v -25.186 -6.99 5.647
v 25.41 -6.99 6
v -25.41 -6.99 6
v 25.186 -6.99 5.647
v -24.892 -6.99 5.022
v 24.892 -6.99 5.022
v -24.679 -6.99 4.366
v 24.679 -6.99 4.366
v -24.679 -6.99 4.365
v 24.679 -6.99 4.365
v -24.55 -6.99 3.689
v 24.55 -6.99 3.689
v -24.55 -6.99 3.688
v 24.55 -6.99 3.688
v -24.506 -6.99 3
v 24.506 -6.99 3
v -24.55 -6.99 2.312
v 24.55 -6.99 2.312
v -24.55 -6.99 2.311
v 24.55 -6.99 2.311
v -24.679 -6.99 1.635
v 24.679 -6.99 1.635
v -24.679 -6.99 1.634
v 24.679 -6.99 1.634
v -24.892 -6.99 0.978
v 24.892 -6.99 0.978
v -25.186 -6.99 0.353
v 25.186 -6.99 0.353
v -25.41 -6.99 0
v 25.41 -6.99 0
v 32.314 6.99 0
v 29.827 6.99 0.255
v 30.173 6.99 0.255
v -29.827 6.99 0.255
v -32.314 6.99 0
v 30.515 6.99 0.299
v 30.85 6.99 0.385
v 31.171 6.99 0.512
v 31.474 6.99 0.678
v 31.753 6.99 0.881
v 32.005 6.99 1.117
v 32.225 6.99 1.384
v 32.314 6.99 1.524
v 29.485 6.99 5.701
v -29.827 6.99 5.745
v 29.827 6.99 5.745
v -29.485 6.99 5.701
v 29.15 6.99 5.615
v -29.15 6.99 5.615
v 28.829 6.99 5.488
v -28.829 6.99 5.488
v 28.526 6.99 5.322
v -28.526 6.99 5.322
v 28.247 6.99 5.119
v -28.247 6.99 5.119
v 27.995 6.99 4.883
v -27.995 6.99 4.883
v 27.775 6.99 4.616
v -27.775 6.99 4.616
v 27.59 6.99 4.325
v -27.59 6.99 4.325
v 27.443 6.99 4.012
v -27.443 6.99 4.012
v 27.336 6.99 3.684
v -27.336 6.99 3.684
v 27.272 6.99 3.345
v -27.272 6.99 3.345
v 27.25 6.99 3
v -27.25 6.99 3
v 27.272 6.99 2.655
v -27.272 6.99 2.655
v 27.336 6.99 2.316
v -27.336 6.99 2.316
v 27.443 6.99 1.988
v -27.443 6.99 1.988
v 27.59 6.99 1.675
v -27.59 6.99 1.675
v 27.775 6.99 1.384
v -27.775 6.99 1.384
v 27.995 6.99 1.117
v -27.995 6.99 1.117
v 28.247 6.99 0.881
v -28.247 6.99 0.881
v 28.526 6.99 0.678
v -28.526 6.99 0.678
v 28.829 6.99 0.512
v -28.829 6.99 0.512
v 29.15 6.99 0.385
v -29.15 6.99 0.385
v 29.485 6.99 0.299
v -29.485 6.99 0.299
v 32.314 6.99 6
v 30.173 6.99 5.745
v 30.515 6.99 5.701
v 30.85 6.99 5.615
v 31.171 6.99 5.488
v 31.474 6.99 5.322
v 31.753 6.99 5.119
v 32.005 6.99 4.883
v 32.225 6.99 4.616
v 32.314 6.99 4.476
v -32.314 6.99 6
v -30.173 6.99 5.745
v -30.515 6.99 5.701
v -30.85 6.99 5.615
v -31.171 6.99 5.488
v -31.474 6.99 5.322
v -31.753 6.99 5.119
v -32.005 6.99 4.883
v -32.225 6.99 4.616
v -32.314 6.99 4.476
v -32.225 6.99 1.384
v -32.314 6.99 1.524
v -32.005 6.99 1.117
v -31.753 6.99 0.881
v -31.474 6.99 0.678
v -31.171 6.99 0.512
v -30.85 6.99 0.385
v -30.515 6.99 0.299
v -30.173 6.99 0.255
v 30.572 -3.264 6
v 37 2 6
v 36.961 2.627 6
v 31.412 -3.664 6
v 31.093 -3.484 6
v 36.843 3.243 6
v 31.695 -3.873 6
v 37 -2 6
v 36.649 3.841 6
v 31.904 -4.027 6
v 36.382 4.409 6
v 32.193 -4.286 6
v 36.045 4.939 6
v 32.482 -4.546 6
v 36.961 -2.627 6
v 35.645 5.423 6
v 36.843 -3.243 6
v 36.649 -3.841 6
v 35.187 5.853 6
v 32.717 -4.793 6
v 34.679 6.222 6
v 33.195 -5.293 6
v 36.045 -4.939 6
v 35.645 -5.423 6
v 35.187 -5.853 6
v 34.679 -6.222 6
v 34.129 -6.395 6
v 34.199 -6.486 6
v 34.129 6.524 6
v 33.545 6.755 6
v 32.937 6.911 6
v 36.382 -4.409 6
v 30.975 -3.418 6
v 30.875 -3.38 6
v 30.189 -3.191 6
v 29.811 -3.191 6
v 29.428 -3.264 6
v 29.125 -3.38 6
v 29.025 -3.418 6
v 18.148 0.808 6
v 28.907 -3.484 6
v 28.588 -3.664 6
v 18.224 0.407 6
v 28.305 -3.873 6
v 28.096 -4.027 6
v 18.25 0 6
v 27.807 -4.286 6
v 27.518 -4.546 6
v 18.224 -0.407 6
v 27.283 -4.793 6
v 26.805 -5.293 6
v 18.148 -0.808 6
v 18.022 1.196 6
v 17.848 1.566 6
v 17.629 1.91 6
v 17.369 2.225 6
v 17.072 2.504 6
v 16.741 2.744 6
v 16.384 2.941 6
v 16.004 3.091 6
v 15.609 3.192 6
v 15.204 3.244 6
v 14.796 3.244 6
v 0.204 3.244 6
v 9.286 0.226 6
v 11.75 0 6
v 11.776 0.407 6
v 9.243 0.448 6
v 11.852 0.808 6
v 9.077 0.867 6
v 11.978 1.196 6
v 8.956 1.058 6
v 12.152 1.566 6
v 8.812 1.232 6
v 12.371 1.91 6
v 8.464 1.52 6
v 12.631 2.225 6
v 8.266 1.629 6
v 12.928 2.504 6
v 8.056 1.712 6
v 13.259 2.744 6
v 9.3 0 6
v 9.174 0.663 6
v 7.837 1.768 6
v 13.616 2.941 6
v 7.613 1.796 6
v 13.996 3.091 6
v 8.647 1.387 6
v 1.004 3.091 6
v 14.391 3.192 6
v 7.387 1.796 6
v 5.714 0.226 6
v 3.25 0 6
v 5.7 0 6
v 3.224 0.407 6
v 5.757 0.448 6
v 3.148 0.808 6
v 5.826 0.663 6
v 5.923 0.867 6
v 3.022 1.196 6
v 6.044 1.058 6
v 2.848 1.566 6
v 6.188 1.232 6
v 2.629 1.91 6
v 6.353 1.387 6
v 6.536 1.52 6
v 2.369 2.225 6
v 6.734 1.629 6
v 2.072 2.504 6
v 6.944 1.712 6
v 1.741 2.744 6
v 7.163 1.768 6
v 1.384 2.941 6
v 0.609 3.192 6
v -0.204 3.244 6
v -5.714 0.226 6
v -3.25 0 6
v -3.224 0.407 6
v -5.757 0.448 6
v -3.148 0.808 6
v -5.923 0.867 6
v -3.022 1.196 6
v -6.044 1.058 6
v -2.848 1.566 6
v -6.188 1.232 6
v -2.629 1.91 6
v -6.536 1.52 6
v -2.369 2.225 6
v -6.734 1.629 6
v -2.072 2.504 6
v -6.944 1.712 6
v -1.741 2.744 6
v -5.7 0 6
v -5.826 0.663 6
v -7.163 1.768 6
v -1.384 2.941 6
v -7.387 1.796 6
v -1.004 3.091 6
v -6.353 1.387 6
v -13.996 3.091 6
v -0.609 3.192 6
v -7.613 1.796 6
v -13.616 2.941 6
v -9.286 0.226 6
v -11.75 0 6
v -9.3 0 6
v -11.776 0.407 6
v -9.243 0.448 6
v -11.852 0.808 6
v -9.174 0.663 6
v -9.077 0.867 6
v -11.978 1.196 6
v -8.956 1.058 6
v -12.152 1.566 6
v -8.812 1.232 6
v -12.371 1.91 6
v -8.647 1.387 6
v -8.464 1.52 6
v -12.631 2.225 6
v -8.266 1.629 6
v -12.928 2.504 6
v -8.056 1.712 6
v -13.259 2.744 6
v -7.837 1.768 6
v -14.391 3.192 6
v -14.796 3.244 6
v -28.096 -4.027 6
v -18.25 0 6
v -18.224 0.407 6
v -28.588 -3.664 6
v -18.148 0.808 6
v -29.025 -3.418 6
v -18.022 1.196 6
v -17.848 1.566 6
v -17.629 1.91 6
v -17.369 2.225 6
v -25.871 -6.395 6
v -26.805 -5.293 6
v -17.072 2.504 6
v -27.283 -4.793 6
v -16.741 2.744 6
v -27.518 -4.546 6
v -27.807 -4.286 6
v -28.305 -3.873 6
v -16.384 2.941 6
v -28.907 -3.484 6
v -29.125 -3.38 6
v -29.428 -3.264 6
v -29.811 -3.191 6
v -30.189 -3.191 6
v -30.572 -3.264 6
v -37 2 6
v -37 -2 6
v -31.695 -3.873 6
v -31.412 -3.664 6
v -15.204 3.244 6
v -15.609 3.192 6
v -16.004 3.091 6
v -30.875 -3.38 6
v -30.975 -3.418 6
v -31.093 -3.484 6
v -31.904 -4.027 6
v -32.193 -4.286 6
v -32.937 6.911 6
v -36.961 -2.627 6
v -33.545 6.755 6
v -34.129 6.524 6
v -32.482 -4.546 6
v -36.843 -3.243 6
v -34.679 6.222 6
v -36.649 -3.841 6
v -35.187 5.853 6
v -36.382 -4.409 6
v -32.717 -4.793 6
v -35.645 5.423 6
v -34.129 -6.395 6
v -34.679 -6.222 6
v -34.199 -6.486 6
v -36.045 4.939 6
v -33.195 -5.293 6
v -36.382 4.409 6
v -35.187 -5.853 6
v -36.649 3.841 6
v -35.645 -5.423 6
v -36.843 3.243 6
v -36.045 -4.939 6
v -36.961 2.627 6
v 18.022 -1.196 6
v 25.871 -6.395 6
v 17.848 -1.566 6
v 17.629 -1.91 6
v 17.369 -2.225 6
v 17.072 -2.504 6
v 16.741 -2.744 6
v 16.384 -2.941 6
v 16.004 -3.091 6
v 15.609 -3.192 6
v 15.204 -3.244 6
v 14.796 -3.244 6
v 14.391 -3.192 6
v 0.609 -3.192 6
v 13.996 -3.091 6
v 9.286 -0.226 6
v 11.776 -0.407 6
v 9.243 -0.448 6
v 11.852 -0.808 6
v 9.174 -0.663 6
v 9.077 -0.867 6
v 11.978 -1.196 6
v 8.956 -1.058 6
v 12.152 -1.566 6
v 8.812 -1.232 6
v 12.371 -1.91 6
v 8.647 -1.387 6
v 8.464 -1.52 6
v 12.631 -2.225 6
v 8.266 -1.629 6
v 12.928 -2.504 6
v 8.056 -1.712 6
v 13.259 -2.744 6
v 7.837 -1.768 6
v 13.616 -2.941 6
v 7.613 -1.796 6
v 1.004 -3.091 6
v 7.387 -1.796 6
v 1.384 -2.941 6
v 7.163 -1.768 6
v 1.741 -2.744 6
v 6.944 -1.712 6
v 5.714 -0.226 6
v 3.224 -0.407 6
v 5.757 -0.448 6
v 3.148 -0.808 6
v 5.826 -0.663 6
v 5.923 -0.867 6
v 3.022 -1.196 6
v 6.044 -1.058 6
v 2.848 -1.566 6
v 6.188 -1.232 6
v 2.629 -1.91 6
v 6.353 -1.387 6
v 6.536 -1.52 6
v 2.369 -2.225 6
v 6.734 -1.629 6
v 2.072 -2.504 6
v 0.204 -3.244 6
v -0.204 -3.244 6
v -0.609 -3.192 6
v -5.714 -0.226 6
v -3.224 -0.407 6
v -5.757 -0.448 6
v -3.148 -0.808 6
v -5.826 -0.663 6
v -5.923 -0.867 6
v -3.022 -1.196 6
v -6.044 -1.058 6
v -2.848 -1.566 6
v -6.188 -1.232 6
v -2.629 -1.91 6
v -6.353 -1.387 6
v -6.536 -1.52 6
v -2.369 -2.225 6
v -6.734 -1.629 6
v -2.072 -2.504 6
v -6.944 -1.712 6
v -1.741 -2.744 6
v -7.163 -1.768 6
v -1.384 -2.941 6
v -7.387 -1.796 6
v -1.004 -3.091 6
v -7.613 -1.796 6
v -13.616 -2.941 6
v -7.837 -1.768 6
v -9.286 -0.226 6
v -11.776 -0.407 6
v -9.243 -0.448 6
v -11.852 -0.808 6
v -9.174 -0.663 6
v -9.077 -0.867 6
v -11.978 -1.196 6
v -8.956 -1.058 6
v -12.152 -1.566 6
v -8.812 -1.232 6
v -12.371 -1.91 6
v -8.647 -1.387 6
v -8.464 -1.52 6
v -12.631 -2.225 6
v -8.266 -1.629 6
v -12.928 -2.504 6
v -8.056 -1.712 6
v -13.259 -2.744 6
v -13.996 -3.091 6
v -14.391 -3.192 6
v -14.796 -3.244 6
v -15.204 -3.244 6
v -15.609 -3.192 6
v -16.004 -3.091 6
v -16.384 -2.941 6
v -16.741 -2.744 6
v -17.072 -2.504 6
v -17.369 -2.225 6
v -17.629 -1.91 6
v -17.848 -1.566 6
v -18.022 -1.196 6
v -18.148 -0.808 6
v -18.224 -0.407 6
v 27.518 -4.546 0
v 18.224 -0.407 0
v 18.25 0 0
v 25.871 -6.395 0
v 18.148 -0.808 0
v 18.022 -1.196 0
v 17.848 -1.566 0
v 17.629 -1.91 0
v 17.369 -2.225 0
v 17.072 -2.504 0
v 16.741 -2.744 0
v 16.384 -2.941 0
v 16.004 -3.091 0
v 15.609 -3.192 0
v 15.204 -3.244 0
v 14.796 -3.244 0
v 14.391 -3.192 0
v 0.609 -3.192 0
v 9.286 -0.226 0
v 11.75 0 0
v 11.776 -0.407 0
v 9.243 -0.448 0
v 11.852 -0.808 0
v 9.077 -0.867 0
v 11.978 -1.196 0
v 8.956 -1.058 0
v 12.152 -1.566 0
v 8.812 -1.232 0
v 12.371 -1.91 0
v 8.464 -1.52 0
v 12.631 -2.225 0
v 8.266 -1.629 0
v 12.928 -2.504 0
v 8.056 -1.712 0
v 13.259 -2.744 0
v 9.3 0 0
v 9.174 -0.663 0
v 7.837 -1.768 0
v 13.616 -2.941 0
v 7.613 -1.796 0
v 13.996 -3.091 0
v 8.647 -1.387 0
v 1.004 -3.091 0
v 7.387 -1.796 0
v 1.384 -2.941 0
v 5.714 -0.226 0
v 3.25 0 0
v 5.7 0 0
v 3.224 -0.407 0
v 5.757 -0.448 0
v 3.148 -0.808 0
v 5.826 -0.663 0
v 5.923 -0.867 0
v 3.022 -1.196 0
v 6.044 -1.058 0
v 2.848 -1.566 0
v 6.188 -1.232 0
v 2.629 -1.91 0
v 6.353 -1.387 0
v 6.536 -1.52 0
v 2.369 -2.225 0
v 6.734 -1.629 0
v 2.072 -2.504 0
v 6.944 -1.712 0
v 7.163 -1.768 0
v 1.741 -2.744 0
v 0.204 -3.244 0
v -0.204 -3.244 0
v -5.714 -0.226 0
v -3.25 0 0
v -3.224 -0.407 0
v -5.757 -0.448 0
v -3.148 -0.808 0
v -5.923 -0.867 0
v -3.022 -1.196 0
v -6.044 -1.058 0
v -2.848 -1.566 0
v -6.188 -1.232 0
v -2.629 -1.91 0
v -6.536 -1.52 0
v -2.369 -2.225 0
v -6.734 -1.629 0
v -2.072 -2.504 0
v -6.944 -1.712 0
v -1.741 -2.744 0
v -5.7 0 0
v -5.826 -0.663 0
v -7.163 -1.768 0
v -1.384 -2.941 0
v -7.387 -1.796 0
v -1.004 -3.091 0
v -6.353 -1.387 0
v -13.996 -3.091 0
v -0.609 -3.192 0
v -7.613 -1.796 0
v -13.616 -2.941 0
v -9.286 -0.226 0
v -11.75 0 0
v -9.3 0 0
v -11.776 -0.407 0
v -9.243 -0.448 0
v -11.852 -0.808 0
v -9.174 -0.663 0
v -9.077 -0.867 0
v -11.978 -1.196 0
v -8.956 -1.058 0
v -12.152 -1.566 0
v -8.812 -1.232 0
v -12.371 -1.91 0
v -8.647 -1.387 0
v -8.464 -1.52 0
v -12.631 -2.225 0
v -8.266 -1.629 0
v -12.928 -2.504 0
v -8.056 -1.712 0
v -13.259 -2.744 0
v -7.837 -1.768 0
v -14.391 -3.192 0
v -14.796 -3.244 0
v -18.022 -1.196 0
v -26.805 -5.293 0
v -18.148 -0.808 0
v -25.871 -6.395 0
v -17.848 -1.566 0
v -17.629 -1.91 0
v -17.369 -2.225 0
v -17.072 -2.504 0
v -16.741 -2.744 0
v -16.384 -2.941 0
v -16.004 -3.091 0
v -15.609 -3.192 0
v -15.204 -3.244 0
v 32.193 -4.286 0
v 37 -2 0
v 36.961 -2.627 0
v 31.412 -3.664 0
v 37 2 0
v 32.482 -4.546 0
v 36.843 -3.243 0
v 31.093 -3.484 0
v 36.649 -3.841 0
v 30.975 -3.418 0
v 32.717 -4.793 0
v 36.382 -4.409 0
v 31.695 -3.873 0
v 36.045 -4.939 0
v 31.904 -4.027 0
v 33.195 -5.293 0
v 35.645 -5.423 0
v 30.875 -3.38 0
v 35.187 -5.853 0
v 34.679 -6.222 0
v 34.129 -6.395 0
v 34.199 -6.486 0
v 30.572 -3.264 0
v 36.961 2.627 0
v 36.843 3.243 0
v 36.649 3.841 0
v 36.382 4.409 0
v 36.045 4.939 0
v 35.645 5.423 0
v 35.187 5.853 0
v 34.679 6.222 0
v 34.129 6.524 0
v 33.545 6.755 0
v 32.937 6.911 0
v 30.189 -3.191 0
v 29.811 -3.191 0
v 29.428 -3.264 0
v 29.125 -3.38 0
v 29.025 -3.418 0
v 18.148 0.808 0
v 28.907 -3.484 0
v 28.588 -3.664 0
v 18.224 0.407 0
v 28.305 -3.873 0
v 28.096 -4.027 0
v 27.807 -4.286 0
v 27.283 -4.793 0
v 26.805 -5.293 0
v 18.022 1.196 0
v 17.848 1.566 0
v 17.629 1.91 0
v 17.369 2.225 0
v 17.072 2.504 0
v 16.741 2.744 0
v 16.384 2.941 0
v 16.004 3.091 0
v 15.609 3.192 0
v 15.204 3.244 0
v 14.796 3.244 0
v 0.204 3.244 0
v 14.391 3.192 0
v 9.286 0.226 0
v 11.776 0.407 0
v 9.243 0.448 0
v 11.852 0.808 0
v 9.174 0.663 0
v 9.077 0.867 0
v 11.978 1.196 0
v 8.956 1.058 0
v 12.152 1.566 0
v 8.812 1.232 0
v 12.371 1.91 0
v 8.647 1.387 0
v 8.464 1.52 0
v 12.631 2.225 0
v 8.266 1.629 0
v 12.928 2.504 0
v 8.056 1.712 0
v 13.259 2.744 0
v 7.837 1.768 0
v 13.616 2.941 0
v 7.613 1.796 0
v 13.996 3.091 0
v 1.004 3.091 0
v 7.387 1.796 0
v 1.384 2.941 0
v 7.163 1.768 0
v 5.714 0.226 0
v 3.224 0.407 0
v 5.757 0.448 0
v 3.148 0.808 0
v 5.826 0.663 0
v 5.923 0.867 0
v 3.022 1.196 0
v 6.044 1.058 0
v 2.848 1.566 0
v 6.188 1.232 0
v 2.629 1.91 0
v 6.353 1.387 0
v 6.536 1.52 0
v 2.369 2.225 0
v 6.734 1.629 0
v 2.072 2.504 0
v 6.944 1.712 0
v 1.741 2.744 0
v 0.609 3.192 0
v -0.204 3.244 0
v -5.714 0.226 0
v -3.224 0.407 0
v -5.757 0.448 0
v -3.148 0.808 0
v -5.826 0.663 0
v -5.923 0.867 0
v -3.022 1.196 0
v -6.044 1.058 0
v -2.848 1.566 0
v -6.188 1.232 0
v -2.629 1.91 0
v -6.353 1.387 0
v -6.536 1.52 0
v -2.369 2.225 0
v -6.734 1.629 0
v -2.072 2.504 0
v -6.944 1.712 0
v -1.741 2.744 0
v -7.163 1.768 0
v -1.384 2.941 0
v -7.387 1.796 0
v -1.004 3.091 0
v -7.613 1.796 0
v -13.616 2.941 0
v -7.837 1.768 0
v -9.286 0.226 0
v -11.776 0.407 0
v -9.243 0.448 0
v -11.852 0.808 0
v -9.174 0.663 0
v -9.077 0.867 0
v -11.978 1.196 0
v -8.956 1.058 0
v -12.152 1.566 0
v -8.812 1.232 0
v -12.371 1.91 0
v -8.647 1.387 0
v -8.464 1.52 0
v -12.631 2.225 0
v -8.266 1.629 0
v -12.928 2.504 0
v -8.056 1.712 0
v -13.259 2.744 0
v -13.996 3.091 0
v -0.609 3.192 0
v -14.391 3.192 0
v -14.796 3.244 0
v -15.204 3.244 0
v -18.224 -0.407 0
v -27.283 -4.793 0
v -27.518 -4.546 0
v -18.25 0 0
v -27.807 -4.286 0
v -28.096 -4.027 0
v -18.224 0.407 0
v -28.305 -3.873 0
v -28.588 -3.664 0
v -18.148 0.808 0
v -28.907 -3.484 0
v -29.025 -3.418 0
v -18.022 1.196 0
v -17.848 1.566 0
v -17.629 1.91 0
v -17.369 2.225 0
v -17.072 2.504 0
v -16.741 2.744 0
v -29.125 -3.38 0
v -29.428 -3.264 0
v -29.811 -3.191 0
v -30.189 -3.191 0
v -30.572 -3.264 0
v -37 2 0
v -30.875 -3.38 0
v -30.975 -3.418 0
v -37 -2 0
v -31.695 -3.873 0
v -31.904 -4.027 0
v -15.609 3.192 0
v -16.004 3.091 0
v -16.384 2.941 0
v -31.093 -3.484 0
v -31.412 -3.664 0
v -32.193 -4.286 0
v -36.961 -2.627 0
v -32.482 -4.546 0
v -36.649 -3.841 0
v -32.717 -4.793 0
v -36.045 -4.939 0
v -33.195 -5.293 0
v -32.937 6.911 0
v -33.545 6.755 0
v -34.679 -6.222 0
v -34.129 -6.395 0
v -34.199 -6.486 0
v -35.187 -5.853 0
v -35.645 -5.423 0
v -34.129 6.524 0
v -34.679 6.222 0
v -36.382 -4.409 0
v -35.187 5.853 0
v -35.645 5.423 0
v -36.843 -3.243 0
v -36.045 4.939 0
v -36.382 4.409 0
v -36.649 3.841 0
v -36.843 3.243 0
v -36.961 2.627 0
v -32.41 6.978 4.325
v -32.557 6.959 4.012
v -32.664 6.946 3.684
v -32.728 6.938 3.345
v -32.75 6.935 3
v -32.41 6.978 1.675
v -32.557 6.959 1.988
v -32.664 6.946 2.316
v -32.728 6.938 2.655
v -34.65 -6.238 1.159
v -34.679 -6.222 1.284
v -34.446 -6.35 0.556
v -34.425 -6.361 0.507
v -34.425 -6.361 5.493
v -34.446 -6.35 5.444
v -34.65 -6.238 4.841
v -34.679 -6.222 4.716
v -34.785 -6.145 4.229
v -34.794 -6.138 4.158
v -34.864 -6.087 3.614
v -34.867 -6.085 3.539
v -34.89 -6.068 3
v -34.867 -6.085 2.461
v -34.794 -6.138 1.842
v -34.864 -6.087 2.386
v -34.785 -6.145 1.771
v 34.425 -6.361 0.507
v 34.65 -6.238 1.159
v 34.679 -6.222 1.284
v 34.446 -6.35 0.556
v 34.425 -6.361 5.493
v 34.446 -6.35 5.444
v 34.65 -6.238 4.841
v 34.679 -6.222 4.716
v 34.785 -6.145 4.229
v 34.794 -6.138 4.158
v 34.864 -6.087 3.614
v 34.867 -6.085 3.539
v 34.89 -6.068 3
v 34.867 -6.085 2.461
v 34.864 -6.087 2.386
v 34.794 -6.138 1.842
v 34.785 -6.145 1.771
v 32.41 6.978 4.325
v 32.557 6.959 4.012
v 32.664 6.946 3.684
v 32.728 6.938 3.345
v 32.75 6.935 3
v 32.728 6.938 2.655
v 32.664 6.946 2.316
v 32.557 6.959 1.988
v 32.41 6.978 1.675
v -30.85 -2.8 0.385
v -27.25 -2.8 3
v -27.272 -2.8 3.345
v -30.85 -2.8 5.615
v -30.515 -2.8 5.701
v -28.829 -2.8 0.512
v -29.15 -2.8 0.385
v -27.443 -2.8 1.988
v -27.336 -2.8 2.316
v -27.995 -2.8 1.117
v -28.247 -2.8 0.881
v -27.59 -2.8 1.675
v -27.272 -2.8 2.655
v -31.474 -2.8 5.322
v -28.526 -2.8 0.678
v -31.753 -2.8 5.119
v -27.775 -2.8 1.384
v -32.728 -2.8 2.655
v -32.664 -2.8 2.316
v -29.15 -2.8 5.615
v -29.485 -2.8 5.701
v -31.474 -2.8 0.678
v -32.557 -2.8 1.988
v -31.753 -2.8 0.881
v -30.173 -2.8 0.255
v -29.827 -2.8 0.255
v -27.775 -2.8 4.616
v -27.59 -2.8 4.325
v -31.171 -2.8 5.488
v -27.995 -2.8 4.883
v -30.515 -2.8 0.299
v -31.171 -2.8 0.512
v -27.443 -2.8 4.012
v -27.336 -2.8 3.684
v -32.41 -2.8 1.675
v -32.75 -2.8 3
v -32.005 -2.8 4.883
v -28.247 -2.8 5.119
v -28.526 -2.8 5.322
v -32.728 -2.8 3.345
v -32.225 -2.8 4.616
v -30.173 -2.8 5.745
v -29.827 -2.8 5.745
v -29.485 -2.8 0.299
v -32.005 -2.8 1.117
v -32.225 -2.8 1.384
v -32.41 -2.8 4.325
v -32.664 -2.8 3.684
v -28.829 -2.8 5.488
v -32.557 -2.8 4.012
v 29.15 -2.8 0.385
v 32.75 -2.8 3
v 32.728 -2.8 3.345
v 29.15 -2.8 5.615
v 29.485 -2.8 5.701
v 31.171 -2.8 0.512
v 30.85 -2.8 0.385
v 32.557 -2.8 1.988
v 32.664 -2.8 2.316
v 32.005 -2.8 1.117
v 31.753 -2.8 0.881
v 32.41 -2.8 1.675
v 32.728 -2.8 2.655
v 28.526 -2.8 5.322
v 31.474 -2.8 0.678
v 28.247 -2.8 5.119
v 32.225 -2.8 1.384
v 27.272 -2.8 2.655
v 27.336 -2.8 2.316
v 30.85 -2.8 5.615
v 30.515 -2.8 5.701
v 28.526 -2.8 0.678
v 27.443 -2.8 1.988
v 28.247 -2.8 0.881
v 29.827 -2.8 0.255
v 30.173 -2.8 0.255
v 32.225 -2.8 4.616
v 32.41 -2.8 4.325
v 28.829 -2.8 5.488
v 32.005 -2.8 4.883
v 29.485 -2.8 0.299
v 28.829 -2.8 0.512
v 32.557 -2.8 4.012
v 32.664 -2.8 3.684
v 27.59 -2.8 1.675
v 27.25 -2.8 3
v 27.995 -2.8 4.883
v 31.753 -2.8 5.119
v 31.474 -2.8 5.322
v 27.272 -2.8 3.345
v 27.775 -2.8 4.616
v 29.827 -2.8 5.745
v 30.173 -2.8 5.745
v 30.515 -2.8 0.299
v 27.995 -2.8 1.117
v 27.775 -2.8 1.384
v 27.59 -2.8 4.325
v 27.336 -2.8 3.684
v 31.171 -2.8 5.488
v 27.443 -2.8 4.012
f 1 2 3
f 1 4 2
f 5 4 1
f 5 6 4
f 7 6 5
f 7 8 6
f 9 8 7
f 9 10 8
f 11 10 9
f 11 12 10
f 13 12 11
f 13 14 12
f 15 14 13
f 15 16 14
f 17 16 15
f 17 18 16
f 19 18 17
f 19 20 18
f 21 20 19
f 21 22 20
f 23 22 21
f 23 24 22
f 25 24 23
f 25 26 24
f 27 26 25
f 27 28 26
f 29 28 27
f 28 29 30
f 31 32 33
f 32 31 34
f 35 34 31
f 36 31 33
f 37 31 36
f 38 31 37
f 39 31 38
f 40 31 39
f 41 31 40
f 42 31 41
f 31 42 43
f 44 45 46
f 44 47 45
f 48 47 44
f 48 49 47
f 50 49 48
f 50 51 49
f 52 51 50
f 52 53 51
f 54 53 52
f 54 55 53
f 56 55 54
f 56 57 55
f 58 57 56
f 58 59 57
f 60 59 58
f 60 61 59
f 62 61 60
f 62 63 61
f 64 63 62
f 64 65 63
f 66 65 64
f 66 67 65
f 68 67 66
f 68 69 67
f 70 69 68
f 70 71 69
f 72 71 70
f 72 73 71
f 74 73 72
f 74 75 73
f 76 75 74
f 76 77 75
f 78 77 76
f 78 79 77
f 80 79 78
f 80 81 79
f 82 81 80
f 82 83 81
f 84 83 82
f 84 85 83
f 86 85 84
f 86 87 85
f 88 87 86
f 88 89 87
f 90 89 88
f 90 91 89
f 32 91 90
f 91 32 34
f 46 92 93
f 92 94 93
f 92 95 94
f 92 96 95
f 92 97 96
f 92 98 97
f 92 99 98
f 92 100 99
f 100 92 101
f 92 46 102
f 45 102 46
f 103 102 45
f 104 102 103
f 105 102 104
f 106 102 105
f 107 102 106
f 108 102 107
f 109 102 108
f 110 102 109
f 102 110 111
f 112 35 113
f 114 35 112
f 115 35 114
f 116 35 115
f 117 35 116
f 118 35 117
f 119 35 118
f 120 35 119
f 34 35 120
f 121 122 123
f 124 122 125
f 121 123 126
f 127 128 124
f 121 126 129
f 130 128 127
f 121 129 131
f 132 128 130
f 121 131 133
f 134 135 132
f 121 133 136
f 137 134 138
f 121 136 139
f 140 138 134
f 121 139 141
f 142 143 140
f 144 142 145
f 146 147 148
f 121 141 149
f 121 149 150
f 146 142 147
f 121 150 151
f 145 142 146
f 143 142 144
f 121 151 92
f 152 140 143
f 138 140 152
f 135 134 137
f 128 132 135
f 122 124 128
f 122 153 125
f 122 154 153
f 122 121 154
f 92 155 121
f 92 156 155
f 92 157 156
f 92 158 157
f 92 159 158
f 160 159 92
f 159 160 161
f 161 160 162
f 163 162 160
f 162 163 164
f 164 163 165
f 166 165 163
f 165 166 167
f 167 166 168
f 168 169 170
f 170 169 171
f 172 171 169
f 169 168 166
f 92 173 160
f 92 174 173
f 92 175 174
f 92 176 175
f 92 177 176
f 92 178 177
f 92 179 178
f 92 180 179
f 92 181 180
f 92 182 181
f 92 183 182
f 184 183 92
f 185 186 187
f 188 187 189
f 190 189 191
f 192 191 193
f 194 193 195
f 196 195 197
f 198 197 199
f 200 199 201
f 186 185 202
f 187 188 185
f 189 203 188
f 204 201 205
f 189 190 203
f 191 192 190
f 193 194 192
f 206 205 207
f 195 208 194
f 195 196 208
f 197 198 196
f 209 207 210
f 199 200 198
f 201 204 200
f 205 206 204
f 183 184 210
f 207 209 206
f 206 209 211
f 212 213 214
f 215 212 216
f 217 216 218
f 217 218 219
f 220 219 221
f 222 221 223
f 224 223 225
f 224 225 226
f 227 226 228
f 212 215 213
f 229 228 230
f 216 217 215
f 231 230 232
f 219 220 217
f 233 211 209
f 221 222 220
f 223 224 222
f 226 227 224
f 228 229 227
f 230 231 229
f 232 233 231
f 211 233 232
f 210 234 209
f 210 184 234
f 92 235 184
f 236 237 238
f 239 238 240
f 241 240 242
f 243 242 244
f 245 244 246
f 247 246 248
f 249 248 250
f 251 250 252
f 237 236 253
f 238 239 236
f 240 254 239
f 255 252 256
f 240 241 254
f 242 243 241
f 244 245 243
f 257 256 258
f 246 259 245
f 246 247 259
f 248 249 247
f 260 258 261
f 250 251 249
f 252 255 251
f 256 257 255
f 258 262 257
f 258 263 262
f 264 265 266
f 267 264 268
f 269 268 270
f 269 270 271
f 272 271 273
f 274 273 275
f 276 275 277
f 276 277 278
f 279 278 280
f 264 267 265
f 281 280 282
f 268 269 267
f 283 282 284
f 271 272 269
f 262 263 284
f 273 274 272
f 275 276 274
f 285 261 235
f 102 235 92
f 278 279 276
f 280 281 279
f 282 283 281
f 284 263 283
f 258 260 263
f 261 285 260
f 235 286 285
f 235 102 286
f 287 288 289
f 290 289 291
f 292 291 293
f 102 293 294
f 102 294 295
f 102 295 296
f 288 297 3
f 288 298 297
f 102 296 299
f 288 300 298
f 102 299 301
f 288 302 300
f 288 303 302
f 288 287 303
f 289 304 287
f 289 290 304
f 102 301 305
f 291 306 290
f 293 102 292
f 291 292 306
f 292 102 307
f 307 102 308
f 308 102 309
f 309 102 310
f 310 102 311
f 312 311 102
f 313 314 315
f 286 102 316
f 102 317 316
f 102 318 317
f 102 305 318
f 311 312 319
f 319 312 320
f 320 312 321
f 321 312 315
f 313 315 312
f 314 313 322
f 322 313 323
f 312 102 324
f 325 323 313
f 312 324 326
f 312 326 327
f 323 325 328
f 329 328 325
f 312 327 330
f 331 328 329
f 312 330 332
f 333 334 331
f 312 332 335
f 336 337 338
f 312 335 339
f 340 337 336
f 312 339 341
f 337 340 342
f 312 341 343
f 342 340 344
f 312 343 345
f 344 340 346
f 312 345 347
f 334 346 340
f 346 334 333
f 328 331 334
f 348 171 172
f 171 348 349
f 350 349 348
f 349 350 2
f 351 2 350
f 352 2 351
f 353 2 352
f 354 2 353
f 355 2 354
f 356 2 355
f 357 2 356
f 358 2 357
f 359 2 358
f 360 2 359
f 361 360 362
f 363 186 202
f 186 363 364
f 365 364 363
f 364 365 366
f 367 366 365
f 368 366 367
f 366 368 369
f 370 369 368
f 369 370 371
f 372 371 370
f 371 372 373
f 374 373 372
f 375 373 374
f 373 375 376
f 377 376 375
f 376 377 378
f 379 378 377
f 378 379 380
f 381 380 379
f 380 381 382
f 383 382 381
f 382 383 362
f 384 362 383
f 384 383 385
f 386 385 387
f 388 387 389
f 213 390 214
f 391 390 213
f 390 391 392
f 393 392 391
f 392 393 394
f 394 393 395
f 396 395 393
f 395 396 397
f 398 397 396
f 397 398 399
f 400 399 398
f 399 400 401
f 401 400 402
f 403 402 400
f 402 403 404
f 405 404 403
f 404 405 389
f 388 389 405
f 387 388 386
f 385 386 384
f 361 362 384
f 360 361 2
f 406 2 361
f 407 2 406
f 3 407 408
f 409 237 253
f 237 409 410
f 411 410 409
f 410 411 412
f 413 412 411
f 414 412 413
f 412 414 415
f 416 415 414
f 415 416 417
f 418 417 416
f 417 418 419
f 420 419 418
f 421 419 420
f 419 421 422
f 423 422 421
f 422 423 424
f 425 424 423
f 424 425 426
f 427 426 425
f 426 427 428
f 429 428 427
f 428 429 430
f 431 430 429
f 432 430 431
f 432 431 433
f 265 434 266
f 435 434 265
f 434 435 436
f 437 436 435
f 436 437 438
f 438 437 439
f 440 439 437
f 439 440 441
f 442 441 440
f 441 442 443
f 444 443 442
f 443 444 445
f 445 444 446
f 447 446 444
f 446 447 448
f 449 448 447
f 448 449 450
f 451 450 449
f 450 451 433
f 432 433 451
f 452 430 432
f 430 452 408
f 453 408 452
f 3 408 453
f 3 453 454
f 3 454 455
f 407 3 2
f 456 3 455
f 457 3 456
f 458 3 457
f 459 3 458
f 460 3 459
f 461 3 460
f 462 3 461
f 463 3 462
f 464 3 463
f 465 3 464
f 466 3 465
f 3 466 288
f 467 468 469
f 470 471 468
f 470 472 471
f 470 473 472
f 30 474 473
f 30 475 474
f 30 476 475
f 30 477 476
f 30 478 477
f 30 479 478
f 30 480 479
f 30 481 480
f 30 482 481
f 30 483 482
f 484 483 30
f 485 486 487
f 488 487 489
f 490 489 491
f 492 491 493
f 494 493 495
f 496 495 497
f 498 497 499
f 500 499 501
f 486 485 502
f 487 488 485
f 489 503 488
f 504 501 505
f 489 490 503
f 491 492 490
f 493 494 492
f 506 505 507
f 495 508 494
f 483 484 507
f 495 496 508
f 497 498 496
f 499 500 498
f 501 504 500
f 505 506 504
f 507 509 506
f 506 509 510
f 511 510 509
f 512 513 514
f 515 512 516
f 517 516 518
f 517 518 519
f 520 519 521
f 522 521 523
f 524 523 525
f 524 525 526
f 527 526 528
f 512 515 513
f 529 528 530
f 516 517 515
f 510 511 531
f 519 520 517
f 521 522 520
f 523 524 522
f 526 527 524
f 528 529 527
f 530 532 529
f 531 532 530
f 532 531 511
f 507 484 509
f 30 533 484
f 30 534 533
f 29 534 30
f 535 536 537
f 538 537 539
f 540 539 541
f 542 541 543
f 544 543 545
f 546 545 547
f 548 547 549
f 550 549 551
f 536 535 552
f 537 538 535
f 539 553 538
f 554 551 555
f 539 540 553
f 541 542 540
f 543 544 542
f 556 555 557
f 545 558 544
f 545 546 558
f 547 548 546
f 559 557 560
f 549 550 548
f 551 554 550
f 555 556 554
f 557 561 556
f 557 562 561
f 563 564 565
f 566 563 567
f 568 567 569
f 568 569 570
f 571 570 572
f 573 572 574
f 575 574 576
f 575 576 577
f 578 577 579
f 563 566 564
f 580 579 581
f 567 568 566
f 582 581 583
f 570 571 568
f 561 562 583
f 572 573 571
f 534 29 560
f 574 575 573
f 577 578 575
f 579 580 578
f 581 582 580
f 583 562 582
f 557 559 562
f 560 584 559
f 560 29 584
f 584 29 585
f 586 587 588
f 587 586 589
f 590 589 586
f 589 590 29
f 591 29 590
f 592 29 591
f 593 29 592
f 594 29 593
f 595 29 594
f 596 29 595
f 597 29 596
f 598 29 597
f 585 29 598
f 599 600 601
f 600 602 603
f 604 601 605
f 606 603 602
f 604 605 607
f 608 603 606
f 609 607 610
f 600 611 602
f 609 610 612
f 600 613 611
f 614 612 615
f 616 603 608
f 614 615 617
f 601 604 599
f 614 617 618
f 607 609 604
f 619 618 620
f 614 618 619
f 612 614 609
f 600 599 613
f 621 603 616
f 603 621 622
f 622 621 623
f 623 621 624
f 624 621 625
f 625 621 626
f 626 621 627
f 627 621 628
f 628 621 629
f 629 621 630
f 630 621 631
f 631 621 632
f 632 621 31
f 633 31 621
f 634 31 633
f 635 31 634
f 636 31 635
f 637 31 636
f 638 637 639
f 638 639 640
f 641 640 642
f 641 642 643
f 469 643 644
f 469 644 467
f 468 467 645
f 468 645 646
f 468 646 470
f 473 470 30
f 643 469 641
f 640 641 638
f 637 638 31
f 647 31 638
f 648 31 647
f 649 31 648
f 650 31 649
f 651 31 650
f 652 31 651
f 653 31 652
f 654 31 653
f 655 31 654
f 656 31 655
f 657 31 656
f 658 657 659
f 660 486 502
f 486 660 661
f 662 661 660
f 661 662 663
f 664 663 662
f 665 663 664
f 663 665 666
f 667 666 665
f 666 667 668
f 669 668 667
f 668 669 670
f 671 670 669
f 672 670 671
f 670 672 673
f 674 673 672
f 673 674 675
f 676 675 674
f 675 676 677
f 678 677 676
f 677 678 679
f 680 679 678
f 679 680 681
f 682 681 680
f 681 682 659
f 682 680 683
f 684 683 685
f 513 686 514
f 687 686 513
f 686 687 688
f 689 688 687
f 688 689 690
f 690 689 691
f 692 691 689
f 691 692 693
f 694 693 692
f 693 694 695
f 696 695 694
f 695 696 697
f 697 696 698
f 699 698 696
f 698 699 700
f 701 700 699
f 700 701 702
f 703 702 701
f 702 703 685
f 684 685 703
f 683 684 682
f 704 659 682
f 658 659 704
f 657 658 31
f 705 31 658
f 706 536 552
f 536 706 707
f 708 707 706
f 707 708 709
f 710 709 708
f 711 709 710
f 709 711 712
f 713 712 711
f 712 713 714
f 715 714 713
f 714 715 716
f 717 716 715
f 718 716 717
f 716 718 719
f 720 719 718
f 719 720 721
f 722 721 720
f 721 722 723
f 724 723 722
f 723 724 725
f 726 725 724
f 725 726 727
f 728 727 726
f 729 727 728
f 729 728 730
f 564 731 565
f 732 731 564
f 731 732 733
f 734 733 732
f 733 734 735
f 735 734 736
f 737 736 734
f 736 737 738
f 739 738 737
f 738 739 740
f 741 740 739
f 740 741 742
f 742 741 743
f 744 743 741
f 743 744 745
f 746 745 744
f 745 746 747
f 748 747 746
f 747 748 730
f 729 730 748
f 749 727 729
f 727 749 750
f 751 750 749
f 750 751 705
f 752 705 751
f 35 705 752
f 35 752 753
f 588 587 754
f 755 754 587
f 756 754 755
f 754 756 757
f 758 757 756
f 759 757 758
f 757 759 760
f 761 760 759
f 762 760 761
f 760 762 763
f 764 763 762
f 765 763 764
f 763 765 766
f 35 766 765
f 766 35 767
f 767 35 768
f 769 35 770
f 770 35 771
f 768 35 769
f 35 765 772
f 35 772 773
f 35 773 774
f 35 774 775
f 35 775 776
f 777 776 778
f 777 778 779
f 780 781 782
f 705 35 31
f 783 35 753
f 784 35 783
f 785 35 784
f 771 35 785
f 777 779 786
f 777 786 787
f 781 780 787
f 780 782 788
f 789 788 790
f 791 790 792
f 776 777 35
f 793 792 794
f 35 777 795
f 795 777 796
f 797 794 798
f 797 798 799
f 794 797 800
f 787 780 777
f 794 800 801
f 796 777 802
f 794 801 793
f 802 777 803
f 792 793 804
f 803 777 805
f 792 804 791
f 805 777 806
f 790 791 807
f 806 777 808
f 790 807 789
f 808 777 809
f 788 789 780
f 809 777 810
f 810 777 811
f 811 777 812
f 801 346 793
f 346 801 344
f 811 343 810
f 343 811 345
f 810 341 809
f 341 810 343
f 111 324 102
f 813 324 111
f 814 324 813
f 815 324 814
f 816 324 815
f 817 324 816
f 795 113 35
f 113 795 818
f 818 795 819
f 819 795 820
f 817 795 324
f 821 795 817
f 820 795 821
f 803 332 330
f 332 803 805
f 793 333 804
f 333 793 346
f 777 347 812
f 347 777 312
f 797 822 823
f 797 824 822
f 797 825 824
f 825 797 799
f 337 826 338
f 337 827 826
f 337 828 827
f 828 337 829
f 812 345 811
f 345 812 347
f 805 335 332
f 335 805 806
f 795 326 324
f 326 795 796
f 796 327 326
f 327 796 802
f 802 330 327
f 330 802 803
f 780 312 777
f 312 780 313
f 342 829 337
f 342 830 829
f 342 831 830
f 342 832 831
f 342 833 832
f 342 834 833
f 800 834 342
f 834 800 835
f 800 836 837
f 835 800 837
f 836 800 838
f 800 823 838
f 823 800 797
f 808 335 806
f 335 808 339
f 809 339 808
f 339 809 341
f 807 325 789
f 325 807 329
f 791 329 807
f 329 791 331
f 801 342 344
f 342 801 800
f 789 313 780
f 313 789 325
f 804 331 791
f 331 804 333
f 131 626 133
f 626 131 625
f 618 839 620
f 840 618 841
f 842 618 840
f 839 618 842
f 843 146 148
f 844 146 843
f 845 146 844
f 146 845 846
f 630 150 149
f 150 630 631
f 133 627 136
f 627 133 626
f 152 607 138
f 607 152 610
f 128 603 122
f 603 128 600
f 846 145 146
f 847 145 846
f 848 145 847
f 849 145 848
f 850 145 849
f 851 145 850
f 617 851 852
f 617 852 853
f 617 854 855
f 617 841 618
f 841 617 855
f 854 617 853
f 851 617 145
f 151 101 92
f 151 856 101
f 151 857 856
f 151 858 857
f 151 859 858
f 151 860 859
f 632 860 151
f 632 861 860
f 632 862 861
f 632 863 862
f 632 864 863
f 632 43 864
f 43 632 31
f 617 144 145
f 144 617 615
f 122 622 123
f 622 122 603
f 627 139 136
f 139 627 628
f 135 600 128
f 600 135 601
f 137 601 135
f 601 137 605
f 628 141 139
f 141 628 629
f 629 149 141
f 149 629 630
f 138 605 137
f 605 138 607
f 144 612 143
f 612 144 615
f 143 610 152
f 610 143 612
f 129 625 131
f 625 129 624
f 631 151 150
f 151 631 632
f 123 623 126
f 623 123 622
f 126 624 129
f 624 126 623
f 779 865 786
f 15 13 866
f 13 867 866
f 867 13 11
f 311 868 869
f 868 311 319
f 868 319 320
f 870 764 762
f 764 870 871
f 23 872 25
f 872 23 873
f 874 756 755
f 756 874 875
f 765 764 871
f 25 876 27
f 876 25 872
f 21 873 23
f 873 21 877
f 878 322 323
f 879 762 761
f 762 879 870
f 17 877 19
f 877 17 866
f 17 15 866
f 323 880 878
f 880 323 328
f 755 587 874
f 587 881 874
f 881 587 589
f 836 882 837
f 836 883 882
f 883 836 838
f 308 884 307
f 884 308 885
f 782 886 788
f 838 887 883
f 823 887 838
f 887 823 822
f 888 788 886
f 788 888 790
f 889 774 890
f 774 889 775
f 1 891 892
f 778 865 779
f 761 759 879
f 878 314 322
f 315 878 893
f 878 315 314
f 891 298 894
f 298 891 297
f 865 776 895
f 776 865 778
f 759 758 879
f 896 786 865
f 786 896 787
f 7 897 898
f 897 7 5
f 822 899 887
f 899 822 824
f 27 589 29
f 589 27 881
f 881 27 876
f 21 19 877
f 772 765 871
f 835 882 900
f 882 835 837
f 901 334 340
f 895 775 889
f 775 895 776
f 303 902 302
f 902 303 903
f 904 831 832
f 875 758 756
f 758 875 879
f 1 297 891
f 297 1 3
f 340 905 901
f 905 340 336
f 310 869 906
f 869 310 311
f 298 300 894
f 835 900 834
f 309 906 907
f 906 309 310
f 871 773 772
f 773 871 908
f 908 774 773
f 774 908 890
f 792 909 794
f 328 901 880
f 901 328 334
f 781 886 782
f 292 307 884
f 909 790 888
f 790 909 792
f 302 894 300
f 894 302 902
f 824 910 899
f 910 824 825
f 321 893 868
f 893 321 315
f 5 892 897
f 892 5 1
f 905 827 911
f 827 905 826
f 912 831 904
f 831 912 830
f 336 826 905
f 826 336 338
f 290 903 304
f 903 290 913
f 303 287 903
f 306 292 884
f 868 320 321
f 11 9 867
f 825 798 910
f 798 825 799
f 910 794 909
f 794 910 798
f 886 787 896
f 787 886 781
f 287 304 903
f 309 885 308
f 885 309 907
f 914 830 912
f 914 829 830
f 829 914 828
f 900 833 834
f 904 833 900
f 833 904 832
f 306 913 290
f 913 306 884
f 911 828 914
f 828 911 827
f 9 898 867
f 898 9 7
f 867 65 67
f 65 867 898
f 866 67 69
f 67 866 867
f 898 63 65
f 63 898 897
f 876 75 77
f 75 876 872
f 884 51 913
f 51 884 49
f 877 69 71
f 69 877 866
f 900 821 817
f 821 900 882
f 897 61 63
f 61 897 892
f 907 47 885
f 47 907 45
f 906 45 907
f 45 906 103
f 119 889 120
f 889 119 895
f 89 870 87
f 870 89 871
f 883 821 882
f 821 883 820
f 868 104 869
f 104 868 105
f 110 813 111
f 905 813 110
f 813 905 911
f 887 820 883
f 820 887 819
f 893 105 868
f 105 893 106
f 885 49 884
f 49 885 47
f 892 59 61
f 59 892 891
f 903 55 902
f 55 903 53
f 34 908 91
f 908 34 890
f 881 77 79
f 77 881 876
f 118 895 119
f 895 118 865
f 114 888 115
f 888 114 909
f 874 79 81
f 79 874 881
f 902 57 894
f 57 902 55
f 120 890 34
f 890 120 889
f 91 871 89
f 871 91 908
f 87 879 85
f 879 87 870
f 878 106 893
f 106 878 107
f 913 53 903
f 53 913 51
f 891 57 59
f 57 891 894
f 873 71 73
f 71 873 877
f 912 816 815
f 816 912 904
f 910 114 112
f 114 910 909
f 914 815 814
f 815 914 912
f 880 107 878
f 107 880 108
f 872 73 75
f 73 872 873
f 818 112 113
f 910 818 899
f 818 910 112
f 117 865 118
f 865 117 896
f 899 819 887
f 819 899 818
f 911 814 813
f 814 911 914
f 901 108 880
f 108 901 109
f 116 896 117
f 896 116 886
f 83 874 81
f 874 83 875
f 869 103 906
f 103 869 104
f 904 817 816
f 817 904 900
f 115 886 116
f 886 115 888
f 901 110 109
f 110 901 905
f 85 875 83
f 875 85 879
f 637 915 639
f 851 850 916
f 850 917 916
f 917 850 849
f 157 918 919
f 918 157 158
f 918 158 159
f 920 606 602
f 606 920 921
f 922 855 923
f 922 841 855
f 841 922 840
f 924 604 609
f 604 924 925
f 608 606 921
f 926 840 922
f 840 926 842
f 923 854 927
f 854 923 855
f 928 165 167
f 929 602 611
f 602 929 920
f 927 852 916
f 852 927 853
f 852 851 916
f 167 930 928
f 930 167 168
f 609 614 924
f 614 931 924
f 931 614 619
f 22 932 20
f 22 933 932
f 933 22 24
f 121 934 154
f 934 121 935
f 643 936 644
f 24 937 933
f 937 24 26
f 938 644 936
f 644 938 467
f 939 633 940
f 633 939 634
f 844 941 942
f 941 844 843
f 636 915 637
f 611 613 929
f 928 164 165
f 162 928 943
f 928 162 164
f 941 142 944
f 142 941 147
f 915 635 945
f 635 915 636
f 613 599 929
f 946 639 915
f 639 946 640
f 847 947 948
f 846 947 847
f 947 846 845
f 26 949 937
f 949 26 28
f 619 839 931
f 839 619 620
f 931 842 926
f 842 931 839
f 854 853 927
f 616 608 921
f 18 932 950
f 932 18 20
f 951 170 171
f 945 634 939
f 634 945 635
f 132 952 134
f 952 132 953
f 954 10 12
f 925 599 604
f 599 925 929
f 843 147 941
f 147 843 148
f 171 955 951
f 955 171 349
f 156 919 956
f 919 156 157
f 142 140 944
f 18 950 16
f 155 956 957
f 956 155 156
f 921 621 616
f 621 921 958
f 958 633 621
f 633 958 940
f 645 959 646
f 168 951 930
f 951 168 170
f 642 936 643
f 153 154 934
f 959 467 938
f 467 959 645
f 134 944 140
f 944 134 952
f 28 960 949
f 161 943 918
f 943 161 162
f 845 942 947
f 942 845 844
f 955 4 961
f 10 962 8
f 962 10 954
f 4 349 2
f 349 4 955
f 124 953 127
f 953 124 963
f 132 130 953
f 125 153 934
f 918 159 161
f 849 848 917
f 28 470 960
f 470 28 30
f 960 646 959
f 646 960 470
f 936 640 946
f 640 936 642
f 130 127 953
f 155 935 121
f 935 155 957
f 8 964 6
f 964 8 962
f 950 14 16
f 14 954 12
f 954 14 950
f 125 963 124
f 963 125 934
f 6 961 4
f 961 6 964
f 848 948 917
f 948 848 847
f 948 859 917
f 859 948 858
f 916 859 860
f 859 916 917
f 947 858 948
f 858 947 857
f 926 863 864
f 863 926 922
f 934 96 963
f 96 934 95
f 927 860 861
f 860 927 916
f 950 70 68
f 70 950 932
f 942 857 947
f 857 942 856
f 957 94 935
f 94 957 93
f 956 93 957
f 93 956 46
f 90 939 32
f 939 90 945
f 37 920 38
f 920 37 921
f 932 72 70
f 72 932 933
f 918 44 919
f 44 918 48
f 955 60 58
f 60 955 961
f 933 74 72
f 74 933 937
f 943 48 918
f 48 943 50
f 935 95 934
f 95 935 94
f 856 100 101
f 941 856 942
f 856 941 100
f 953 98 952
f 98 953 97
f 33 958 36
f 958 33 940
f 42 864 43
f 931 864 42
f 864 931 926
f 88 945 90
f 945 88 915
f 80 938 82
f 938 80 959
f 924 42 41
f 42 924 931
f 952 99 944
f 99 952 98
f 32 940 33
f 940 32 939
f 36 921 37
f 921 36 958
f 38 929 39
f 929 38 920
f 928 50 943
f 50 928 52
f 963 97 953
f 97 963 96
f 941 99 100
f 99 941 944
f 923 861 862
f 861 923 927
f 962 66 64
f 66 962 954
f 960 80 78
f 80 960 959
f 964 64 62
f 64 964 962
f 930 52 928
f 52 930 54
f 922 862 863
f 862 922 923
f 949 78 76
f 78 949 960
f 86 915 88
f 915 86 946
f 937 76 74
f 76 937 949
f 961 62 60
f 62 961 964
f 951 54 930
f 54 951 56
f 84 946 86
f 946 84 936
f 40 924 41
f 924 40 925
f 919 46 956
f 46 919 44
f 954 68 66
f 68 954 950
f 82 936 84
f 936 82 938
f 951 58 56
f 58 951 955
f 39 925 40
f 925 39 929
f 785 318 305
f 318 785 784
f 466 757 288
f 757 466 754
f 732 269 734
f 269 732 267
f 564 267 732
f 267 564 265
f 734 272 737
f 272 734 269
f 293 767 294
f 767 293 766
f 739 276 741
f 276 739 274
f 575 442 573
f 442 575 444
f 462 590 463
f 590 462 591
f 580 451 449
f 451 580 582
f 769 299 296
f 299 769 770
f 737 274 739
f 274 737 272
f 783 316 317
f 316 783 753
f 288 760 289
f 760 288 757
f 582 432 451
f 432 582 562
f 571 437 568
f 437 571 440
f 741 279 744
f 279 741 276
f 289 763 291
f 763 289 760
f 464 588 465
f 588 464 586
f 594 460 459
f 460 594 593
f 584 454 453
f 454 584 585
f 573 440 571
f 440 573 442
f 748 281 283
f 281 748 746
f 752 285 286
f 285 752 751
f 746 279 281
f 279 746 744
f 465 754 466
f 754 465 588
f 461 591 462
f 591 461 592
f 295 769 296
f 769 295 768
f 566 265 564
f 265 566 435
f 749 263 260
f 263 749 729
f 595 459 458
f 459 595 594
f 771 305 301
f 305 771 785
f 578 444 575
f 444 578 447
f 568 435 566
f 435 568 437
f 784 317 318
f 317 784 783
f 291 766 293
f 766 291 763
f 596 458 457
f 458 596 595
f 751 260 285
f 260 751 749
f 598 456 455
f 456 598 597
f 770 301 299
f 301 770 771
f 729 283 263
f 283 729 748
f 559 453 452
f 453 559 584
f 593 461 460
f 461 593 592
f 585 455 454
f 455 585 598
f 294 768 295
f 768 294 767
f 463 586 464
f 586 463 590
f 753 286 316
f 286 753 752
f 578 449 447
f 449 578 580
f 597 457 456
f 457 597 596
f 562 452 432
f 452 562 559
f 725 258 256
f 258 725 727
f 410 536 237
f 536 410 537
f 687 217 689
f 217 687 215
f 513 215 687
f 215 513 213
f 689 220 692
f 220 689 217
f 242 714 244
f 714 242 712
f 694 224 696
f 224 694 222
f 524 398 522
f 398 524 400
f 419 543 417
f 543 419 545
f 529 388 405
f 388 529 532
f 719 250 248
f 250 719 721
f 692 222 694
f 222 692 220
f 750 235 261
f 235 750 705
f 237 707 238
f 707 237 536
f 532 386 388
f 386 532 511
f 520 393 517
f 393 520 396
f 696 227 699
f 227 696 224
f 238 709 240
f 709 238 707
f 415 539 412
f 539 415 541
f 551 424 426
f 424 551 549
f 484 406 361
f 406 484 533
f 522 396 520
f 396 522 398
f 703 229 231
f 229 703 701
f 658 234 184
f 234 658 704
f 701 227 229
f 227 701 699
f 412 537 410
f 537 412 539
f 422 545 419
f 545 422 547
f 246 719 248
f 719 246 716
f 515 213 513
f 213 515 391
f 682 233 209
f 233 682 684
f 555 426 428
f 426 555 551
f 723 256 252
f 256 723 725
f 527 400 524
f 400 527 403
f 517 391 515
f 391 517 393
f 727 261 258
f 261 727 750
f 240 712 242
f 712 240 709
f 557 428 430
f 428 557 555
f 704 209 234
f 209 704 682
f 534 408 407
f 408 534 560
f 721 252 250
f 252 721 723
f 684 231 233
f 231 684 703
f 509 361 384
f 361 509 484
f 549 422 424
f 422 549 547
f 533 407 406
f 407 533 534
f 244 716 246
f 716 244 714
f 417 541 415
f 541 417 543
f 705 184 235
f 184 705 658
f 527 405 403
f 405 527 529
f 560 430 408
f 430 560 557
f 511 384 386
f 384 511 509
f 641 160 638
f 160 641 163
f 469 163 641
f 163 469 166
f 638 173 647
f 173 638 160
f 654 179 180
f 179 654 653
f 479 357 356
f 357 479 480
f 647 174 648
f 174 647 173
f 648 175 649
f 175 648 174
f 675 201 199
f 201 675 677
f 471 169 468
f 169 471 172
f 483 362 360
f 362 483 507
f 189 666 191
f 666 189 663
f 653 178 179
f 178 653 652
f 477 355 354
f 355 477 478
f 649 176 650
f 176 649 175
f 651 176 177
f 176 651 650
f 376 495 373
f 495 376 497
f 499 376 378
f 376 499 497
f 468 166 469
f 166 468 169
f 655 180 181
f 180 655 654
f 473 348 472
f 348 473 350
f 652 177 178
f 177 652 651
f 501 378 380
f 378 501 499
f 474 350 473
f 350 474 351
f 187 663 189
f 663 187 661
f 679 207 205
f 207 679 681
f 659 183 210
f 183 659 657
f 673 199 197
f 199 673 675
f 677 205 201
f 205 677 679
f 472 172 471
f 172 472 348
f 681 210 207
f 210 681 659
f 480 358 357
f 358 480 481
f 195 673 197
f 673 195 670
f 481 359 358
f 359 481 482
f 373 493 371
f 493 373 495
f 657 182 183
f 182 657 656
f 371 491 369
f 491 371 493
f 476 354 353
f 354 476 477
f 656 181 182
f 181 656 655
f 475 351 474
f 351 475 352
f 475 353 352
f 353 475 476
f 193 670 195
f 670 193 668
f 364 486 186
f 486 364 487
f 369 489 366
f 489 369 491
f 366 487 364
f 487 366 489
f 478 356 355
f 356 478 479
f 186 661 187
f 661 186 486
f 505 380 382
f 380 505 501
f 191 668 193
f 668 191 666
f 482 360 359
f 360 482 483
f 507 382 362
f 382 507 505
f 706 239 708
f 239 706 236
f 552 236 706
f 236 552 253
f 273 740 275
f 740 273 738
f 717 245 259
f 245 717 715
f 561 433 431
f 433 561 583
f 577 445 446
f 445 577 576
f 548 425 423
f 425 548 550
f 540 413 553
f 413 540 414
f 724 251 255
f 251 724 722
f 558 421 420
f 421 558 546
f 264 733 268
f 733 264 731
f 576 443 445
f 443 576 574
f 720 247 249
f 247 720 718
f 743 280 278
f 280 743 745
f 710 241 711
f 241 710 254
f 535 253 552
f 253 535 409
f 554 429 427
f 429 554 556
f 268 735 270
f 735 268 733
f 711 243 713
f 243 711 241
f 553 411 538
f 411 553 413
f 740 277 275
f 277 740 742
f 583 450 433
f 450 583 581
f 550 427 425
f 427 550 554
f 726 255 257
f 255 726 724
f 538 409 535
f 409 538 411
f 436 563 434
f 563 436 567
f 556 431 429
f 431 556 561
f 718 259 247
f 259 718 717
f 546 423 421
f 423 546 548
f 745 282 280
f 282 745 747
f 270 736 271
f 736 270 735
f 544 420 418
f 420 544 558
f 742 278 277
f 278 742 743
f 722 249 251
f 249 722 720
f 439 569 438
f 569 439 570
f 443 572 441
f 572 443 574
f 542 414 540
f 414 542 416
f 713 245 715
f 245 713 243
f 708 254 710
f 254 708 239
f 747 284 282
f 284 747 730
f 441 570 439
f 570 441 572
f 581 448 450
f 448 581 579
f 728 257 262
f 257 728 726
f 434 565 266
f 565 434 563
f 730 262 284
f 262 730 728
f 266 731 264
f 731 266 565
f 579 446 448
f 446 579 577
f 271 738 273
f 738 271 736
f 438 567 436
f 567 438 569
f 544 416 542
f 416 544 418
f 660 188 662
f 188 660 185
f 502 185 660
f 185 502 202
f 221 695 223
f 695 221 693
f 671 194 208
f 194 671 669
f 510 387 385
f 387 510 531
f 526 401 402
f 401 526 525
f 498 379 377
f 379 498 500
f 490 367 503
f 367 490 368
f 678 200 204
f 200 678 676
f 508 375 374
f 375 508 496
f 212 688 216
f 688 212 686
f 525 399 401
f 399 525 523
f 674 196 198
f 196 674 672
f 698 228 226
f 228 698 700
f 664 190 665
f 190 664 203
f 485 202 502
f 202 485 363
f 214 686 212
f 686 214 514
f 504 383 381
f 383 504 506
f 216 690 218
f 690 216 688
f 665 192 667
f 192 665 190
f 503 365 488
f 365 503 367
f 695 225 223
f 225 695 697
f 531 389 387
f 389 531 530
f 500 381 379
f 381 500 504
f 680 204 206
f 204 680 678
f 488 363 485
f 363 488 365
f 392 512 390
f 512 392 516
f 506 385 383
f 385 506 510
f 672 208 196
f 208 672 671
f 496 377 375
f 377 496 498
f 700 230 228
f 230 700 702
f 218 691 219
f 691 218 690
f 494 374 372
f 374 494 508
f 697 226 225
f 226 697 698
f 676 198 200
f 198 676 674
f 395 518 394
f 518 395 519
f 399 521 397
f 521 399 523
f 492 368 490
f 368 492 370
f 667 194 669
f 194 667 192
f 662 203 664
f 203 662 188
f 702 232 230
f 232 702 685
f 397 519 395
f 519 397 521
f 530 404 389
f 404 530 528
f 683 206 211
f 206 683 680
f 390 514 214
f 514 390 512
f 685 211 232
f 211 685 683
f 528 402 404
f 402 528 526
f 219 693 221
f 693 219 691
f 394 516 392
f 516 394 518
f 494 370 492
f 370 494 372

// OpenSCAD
$fn = 50;


difference() {
	union() {
		hull() {
			translate(v = [-17.0000000000, 2.0000000000, 0]) {
				cylinder(h = 6, r = 5);
			}
			translate(v = [17.0000000000, 2.0000000000, 0]) {
				cylinder(h = 6, r = 5);
			}
			translate(v = [-17.0000000000, -2.0000000000, 0]) {
				cylinder(h = 6, r = 5);
			}
			translate(v = [17.0000000000, -2.0000000000, 0]) {
				cylinder(h = 6, r = 5);
			}
		}
		translate(v = [-22.5000000000, 0.0000000000, 0]) {
			hull() {
				translate(v = [-9.5000000000, 2.0000000000, 0]) {
					cylinder(h = 6, r = 5);
				}
				translate(v = [9.5000000000, 2.0000000000, 0]) {
					cylinder(h = 6, r = 5);
				}
				translate(v = [-9.5000000000, -2.0000000000, 0]) {
					cylinder(h = 6, r = 5);
				}
				translate(v = [9.5000000000, -2.0000000000, 0]) {
					cylinder(h = 6, r = 5);
				}
			}
		}
		translate(v = [22.5000000000, 0.0000000000, 0]) {
			hull() {
				translate(v = [-9.5000000000, 2.0000000000, 0]) {
					cylinder(h = 6, r = 5);
				}
				translate(v = [9.5000000000, 2.0000000000, 0]) {
					cylinder(h = 6, r = 5);
				}
				translate(v = [-9.5000000000, -2.0000000000, 0]) {
					cylinder(h = 6, r = 5);
				}
				translate(v = [9.5000000000, -2.0000000000, 0]) {
					cylinder(h = 6, r = 5);
				}
			}
		}
	}
	union() {
		translate(v = [-30.0000000000, -7.0000000000, 3.0000000000]) {
			rotate(a = [90, 0, 0]) {
				difference() {
					union() {
						#translate(v = [0, 0, -14.0000000000]) {
							cylinder(h = 14, r = 2.2500000000);
						}
						#translate(v = [0, 0, -4.2000000000]) {
							cylinder(h = 4.2000000000, r1 = 2.7500000000, r2 = 5.5000000000);
						}
						#translate(v = [0, 0, -14.0000000000]) {
							cylinder(h = 14, r = 2.7500000000);
						}
						#translate(v = [0, 0, -14.0000000000]) {
							cylinder(h = 14, r = 2.2500000000);
						}
					}
					union();
				}
			}
		}
		translate(v = [30.0000000000, -7.0000000000, 3.0000000000]) {
			rotate(a = [90, 0, 0]) {
				difference() {
					union() {
						#translate(v = [0, 0, -14.0000000000]) {
							cylinder(h = 14, r = 2.2500000000);
						}
						#translate(v = [0, 0, -4.2000000000]) {
							cylinder(h = 4.2000000000, r1 = 2.7500000000, r2 = 5.5000000000);
						}
						#translate(v = [0, 0, -14.0000000000]) {
							cylinder(h = 14, r = 2.7500000000);
						}
						#translate(v = [0, 0, -14.0000000000]) {
							cylinder(h = 14, r = 2.2500000000);
						}
					}
					union();
				}
			}
		}
		translate(v = [-15.0000000000, 0.0000000000, 0]) {
			translate(v = [0, 0, -100]) {
				cylinder(h = 200, r = 3.2500000000);
			}
		}
		translate(v = [0, 0, -100]) {
			cylinder(h = 200, r = 3.2500000000);
		}
		translate(v = [15.0000000000, 0.0000000000, 0]) {
			translate(v = [0, 0, -100]) {
				cylinder(h = 200, r = 3.2500000000);
			}
		}
		translate(v = [-15.0000000000, 0.0000000000, 0]) {
			translate(v = [0, 0, -100]) {
				cylinder(h = 200, r = 1.8000000000);
			}
		}
		translate(v = [-7.5000000000, 0.0000000000, 0]) {
			translate(v = [0, 0, -100]) {
				cylinder(h = 200, r = 1.8000000000);
			}
		}
		translate(v = [0, 0, -100]) {
			cylinder(h = 200, r = 1.8000000000);
		}
		translate(v = [7.5000000000, 0.0000000000, 0]) {
			translate(v = [0, 0, -100]) {
				cylinder(h = 200, r = 1.8000000000);
			}
		}
		translate(v = [15.0000000000, 0.0000000000, 0]) {
			translate(v = [0, 0, -100]) {
				cylinder(h = 200, r = 1.8000000000);
			}
		}
	}
}
